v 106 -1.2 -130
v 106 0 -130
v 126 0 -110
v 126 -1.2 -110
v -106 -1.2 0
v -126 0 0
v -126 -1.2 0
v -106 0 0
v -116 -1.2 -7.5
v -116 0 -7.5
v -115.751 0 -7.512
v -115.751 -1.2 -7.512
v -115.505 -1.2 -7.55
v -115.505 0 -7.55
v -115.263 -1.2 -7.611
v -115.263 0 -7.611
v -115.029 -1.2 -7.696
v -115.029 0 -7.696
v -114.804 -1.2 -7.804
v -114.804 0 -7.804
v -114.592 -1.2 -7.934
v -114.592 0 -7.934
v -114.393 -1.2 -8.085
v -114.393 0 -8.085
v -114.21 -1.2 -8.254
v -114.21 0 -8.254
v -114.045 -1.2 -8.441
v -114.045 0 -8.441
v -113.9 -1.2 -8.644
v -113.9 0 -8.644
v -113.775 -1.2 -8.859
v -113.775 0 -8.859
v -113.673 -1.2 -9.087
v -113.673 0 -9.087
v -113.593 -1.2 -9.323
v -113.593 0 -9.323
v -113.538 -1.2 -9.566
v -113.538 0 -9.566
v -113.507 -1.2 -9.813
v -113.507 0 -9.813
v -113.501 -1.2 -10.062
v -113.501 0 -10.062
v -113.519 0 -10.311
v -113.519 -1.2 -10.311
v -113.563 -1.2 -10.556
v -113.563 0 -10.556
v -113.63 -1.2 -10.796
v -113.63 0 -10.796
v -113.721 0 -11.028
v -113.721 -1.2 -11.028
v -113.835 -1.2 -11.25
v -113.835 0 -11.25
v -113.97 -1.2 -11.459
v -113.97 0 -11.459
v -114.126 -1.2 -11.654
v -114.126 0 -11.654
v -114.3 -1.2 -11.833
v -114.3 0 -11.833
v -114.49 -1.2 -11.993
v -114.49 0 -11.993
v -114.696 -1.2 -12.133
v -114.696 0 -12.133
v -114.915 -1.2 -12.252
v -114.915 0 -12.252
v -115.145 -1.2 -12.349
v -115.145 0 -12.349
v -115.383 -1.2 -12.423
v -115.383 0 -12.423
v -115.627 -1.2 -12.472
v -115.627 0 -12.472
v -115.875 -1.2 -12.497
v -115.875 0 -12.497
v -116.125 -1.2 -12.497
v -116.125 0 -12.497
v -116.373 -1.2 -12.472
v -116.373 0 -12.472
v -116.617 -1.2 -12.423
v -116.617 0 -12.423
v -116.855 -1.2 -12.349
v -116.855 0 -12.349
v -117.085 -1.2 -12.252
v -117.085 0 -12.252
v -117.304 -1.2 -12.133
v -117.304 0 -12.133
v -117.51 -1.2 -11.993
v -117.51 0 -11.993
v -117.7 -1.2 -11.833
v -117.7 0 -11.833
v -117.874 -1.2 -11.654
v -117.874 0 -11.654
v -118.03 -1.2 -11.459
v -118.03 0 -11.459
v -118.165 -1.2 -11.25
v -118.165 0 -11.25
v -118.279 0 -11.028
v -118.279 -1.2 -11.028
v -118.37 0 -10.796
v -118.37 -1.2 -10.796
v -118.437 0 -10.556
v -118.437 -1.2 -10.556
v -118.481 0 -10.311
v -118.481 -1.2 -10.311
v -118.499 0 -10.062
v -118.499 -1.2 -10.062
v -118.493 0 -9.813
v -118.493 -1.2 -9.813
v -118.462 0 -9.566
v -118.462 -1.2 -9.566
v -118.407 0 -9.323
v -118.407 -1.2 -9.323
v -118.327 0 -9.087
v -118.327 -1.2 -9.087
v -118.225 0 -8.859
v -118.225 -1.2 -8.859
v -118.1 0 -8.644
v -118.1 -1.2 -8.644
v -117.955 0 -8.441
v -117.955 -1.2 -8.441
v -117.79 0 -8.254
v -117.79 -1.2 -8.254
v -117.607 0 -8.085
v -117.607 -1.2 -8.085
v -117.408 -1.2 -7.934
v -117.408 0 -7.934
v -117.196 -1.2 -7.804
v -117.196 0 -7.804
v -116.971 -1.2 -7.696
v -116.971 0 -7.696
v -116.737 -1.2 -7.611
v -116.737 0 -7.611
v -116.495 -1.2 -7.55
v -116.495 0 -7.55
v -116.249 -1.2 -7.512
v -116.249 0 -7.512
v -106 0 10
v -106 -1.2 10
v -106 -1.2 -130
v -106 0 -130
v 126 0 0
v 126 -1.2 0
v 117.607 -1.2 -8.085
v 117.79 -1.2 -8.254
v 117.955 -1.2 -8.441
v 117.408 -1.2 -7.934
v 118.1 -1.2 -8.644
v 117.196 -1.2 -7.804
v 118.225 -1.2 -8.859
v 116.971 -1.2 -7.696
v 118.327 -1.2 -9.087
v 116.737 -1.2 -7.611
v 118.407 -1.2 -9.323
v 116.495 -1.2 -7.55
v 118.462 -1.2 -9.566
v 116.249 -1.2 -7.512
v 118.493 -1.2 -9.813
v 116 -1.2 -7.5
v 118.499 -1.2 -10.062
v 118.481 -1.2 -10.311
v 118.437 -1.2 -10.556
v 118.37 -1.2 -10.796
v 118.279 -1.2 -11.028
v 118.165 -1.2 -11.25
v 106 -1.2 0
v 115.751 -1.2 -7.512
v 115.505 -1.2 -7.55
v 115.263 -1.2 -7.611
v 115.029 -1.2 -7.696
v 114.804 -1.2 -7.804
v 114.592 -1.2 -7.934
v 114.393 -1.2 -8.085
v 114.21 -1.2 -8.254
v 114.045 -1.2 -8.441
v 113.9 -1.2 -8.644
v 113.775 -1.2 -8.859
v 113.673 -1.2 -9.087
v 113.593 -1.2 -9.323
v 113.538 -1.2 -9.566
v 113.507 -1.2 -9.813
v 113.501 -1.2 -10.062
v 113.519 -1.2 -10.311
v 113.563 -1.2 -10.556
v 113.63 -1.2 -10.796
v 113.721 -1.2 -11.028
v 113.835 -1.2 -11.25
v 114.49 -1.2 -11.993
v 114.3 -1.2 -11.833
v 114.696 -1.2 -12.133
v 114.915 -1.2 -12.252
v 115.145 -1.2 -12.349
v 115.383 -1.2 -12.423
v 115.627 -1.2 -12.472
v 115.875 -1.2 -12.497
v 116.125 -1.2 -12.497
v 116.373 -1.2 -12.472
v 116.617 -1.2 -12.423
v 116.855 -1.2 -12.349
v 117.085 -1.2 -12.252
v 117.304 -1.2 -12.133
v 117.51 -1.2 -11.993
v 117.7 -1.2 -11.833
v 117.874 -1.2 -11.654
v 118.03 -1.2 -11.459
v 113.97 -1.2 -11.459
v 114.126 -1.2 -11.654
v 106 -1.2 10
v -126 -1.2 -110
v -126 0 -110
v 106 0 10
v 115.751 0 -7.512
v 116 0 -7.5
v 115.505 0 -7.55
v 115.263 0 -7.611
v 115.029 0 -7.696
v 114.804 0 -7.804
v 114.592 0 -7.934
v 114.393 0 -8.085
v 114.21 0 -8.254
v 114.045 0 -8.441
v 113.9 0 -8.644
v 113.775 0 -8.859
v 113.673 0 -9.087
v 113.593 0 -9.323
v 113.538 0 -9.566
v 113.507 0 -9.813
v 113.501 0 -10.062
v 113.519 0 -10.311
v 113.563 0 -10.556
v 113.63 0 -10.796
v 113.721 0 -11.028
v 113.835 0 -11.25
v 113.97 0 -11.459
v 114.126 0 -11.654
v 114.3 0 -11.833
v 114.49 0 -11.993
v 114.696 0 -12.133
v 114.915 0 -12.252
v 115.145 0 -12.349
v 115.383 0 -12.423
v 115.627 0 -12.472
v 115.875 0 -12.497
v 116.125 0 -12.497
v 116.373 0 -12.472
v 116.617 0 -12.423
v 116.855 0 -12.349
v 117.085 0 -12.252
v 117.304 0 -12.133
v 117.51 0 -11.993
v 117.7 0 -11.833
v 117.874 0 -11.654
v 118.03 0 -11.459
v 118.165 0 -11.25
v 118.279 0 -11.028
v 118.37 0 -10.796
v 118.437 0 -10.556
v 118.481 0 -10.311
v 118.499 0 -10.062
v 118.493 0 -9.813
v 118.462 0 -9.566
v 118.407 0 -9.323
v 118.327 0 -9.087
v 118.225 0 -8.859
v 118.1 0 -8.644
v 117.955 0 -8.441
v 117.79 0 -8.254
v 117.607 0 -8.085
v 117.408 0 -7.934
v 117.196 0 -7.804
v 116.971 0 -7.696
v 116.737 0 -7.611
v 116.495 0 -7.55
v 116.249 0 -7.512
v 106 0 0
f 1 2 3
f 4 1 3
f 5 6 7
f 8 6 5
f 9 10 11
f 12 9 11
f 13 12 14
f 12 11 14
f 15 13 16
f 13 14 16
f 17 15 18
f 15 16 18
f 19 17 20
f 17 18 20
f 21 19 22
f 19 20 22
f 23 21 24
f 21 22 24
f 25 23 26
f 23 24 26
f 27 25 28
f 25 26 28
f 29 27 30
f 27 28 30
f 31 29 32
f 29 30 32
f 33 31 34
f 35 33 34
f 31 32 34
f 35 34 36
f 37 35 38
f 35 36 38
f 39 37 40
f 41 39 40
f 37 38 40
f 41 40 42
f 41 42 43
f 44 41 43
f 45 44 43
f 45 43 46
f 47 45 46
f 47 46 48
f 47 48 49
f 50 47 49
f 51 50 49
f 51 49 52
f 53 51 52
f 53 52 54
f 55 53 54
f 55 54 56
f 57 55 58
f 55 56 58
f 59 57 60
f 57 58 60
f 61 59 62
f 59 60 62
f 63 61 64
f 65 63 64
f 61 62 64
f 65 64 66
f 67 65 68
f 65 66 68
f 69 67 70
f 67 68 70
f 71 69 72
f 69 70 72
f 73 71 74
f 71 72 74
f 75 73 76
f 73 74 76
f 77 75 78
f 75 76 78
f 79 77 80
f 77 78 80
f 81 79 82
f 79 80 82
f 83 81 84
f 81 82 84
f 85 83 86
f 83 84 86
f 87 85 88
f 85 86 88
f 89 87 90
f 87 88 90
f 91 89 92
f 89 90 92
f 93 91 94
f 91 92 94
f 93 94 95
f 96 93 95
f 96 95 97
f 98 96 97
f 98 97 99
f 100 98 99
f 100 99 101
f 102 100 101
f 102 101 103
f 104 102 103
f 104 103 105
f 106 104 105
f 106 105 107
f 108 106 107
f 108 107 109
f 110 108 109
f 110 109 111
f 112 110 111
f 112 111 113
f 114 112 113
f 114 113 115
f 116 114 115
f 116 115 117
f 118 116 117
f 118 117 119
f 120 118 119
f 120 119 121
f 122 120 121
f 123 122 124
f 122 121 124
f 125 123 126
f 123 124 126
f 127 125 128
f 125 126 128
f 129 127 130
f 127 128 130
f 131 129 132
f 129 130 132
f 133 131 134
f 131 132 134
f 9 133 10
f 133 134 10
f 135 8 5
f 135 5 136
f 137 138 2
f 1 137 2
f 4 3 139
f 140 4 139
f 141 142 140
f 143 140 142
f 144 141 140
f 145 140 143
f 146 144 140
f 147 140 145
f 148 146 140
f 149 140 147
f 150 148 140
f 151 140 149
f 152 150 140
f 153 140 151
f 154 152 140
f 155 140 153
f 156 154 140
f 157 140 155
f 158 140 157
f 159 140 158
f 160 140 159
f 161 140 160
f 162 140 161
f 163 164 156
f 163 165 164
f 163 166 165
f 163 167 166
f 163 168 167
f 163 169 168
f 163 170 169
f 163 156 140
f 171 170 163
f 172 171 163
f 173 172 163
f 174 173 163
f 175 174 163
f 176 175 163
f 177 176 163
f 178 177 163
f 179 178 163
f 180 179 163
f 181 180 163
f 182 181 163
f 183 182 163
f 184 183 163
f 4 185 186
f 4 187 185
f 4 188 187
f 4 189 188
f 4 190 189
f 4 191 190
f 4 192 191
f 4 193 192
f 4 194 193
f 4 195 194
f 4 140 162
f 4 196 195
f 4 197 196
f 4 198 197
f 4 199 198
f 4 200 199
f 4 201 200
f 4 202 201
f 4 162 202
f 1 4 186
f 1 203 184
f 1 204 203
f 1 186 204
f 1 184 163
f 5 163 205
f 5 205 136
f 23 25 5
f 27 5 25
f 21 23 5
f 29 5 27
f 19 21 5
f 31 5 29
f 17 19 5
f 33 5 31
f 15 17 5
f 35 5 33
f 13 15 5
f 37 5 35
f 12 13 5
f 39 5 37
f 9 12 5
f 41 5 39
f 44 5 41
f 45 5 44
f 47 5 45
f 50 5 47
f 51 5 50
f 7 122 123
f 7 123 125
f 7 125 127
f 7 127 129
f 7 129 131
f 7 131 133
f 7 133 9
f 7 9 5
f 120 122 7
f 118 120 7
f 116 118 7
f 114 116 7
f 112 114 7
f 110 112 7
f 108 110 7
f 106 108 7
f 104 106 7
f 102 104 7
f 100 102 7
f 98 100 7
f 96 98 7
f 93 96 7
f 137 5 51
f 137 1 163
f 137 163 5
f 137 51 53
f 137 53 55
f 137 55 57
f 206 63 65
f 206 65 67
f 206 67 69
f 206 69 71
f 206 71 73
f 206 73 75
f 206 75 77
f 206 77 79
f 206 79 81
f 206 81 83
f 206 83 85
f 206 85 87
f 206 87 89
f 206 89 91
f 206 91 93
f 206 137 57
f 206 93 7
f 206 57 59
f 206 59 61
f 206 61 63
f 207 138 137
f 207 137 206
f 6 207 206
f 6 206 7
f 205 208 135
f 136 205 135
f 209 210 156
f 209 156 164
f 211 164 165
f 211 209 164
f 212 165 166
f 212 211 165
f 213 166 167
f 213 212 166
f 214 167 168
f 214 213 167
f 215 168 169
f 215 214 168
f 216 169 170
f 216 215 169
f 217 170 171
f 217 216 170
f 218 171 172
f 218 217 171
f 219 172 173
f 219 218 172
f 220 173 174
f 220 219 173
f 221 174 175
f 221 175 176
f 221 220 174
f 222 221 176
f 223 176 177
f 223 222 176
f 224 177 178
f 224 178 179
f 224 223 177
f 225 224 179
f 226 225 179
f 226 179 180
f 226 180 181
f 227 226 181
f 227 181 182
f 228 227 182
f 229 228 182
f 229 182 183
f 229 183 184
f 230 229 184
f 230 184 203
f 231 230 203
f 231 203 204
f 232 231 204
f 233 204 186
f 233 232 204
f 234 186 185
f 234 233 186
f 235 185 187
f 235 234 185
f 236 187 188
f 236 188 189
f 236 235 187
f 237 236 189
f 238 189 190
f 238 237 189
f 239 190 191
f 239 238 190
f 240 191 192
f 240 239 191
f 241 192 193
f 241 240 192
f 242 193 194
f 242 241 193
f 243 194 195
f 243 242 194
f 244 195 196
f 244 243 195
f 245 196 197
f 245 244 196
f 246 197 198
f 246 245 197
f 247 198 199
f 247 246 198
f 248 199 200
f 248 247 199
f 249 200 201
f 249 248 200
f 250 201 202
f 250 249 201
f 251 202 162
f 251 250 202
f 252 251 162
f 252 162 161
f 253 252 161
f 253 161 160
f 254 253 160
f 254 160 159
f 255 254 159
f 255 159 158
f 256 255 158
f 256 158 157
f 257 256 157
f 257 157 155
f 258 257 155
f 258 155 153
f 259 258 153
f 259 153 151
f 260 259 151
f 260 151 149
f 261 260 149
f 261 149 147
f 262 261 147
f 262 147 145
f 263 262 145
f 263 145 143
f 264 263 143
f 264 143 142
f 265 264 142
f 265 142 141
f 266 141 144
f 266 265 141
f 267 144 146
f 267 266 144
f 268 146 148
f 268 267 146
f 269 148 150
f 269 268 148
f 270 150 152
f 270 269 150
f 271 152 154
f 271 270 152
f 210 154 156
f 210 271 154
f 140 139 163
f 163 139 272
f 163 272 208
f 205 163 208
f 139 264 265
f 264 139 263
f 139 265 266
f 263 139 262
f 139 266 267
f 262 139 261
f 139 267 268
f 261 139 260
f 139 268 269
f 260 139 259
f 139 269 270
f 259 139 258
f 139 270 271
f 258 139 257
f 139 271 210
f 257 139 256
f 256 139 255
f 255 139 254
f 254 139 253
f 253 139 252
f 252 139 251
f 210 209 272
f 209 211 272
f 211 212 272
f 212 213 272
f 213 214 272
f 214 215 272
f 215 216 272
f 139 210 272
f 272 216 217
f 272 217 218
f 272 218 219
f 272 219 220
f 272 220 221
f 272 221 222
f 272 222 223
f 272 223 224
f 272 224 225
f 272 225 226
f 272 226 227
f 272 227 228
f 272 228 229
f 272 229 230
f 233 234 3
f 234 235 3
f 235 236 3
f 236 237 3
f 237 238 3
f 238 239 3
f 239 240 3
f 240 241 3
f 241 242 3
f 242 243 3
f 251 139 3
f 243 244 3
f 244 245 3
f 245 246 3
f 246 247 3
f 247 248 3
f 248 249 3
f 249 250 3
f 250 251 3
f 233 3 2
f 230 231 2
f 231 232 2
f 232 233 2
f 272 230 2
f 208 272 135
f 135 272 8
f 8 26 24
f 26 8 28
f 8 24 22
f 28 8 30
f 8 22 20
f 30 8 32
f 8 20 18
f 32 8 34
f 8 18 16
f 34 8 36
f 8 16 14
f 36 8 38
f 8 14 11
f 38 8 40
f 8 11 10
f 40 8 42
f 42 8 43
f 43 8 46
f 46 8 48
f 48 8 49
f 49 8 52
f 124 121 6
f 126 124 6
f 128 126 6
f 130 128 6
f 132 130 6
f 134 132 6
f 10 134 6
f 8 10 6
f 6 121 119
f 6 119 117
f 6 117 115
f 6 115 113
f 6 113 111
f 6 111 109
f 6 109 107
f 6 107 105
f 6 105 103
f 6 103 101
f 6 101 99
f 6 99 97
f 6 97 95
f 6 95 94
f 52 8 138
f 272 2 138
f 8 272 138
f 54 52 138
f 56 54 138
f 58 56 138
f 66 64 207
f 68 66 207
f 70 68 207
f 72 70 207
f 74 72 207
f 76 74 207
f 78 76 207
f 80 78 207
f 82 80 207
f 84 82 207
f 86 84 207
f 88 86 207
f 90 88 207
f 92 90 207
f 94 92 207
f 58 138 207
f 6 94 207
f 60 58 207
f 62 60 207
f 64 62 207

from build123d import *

# Parameters (mm, degrees)
SKETCH_1_R             = 2.5
SM_BASE_FLANGE_1_DEPTH = 1.2


# Sheet-metal steps are written as plain solids
with BuildPart() as part:
    # Sketch 1 → 基材-凸緣1 (new body)
    with BuildSketch(Plane(origin=(0, 0, 0), x_dir=(1, 0, 0), z_dir=(0, 1, 0))):
        Polygon((-126, 0), (-106, 0), (-106, -10), (0, -10), (0, 130), (-106, 130), (-126, 110), align=None)
        with Locations(Location((-116, 10, 0), (0, 0, 270))):
            Circle(SKETCH_1_R, mode=Mode.SUBTRACT)
    extrude(amount=-SM_BASE_FLANGE_1_DEPTH)

    # 鏡射1: part across face


with BuildPart() as part_1:
    add(part.part)
    add(part.part.mirror(Plane(origin=(0, -0.6, -60), x_dir=(0, 0, 1), z_dir=(1, 0, 0))))


solid = part_1.part
